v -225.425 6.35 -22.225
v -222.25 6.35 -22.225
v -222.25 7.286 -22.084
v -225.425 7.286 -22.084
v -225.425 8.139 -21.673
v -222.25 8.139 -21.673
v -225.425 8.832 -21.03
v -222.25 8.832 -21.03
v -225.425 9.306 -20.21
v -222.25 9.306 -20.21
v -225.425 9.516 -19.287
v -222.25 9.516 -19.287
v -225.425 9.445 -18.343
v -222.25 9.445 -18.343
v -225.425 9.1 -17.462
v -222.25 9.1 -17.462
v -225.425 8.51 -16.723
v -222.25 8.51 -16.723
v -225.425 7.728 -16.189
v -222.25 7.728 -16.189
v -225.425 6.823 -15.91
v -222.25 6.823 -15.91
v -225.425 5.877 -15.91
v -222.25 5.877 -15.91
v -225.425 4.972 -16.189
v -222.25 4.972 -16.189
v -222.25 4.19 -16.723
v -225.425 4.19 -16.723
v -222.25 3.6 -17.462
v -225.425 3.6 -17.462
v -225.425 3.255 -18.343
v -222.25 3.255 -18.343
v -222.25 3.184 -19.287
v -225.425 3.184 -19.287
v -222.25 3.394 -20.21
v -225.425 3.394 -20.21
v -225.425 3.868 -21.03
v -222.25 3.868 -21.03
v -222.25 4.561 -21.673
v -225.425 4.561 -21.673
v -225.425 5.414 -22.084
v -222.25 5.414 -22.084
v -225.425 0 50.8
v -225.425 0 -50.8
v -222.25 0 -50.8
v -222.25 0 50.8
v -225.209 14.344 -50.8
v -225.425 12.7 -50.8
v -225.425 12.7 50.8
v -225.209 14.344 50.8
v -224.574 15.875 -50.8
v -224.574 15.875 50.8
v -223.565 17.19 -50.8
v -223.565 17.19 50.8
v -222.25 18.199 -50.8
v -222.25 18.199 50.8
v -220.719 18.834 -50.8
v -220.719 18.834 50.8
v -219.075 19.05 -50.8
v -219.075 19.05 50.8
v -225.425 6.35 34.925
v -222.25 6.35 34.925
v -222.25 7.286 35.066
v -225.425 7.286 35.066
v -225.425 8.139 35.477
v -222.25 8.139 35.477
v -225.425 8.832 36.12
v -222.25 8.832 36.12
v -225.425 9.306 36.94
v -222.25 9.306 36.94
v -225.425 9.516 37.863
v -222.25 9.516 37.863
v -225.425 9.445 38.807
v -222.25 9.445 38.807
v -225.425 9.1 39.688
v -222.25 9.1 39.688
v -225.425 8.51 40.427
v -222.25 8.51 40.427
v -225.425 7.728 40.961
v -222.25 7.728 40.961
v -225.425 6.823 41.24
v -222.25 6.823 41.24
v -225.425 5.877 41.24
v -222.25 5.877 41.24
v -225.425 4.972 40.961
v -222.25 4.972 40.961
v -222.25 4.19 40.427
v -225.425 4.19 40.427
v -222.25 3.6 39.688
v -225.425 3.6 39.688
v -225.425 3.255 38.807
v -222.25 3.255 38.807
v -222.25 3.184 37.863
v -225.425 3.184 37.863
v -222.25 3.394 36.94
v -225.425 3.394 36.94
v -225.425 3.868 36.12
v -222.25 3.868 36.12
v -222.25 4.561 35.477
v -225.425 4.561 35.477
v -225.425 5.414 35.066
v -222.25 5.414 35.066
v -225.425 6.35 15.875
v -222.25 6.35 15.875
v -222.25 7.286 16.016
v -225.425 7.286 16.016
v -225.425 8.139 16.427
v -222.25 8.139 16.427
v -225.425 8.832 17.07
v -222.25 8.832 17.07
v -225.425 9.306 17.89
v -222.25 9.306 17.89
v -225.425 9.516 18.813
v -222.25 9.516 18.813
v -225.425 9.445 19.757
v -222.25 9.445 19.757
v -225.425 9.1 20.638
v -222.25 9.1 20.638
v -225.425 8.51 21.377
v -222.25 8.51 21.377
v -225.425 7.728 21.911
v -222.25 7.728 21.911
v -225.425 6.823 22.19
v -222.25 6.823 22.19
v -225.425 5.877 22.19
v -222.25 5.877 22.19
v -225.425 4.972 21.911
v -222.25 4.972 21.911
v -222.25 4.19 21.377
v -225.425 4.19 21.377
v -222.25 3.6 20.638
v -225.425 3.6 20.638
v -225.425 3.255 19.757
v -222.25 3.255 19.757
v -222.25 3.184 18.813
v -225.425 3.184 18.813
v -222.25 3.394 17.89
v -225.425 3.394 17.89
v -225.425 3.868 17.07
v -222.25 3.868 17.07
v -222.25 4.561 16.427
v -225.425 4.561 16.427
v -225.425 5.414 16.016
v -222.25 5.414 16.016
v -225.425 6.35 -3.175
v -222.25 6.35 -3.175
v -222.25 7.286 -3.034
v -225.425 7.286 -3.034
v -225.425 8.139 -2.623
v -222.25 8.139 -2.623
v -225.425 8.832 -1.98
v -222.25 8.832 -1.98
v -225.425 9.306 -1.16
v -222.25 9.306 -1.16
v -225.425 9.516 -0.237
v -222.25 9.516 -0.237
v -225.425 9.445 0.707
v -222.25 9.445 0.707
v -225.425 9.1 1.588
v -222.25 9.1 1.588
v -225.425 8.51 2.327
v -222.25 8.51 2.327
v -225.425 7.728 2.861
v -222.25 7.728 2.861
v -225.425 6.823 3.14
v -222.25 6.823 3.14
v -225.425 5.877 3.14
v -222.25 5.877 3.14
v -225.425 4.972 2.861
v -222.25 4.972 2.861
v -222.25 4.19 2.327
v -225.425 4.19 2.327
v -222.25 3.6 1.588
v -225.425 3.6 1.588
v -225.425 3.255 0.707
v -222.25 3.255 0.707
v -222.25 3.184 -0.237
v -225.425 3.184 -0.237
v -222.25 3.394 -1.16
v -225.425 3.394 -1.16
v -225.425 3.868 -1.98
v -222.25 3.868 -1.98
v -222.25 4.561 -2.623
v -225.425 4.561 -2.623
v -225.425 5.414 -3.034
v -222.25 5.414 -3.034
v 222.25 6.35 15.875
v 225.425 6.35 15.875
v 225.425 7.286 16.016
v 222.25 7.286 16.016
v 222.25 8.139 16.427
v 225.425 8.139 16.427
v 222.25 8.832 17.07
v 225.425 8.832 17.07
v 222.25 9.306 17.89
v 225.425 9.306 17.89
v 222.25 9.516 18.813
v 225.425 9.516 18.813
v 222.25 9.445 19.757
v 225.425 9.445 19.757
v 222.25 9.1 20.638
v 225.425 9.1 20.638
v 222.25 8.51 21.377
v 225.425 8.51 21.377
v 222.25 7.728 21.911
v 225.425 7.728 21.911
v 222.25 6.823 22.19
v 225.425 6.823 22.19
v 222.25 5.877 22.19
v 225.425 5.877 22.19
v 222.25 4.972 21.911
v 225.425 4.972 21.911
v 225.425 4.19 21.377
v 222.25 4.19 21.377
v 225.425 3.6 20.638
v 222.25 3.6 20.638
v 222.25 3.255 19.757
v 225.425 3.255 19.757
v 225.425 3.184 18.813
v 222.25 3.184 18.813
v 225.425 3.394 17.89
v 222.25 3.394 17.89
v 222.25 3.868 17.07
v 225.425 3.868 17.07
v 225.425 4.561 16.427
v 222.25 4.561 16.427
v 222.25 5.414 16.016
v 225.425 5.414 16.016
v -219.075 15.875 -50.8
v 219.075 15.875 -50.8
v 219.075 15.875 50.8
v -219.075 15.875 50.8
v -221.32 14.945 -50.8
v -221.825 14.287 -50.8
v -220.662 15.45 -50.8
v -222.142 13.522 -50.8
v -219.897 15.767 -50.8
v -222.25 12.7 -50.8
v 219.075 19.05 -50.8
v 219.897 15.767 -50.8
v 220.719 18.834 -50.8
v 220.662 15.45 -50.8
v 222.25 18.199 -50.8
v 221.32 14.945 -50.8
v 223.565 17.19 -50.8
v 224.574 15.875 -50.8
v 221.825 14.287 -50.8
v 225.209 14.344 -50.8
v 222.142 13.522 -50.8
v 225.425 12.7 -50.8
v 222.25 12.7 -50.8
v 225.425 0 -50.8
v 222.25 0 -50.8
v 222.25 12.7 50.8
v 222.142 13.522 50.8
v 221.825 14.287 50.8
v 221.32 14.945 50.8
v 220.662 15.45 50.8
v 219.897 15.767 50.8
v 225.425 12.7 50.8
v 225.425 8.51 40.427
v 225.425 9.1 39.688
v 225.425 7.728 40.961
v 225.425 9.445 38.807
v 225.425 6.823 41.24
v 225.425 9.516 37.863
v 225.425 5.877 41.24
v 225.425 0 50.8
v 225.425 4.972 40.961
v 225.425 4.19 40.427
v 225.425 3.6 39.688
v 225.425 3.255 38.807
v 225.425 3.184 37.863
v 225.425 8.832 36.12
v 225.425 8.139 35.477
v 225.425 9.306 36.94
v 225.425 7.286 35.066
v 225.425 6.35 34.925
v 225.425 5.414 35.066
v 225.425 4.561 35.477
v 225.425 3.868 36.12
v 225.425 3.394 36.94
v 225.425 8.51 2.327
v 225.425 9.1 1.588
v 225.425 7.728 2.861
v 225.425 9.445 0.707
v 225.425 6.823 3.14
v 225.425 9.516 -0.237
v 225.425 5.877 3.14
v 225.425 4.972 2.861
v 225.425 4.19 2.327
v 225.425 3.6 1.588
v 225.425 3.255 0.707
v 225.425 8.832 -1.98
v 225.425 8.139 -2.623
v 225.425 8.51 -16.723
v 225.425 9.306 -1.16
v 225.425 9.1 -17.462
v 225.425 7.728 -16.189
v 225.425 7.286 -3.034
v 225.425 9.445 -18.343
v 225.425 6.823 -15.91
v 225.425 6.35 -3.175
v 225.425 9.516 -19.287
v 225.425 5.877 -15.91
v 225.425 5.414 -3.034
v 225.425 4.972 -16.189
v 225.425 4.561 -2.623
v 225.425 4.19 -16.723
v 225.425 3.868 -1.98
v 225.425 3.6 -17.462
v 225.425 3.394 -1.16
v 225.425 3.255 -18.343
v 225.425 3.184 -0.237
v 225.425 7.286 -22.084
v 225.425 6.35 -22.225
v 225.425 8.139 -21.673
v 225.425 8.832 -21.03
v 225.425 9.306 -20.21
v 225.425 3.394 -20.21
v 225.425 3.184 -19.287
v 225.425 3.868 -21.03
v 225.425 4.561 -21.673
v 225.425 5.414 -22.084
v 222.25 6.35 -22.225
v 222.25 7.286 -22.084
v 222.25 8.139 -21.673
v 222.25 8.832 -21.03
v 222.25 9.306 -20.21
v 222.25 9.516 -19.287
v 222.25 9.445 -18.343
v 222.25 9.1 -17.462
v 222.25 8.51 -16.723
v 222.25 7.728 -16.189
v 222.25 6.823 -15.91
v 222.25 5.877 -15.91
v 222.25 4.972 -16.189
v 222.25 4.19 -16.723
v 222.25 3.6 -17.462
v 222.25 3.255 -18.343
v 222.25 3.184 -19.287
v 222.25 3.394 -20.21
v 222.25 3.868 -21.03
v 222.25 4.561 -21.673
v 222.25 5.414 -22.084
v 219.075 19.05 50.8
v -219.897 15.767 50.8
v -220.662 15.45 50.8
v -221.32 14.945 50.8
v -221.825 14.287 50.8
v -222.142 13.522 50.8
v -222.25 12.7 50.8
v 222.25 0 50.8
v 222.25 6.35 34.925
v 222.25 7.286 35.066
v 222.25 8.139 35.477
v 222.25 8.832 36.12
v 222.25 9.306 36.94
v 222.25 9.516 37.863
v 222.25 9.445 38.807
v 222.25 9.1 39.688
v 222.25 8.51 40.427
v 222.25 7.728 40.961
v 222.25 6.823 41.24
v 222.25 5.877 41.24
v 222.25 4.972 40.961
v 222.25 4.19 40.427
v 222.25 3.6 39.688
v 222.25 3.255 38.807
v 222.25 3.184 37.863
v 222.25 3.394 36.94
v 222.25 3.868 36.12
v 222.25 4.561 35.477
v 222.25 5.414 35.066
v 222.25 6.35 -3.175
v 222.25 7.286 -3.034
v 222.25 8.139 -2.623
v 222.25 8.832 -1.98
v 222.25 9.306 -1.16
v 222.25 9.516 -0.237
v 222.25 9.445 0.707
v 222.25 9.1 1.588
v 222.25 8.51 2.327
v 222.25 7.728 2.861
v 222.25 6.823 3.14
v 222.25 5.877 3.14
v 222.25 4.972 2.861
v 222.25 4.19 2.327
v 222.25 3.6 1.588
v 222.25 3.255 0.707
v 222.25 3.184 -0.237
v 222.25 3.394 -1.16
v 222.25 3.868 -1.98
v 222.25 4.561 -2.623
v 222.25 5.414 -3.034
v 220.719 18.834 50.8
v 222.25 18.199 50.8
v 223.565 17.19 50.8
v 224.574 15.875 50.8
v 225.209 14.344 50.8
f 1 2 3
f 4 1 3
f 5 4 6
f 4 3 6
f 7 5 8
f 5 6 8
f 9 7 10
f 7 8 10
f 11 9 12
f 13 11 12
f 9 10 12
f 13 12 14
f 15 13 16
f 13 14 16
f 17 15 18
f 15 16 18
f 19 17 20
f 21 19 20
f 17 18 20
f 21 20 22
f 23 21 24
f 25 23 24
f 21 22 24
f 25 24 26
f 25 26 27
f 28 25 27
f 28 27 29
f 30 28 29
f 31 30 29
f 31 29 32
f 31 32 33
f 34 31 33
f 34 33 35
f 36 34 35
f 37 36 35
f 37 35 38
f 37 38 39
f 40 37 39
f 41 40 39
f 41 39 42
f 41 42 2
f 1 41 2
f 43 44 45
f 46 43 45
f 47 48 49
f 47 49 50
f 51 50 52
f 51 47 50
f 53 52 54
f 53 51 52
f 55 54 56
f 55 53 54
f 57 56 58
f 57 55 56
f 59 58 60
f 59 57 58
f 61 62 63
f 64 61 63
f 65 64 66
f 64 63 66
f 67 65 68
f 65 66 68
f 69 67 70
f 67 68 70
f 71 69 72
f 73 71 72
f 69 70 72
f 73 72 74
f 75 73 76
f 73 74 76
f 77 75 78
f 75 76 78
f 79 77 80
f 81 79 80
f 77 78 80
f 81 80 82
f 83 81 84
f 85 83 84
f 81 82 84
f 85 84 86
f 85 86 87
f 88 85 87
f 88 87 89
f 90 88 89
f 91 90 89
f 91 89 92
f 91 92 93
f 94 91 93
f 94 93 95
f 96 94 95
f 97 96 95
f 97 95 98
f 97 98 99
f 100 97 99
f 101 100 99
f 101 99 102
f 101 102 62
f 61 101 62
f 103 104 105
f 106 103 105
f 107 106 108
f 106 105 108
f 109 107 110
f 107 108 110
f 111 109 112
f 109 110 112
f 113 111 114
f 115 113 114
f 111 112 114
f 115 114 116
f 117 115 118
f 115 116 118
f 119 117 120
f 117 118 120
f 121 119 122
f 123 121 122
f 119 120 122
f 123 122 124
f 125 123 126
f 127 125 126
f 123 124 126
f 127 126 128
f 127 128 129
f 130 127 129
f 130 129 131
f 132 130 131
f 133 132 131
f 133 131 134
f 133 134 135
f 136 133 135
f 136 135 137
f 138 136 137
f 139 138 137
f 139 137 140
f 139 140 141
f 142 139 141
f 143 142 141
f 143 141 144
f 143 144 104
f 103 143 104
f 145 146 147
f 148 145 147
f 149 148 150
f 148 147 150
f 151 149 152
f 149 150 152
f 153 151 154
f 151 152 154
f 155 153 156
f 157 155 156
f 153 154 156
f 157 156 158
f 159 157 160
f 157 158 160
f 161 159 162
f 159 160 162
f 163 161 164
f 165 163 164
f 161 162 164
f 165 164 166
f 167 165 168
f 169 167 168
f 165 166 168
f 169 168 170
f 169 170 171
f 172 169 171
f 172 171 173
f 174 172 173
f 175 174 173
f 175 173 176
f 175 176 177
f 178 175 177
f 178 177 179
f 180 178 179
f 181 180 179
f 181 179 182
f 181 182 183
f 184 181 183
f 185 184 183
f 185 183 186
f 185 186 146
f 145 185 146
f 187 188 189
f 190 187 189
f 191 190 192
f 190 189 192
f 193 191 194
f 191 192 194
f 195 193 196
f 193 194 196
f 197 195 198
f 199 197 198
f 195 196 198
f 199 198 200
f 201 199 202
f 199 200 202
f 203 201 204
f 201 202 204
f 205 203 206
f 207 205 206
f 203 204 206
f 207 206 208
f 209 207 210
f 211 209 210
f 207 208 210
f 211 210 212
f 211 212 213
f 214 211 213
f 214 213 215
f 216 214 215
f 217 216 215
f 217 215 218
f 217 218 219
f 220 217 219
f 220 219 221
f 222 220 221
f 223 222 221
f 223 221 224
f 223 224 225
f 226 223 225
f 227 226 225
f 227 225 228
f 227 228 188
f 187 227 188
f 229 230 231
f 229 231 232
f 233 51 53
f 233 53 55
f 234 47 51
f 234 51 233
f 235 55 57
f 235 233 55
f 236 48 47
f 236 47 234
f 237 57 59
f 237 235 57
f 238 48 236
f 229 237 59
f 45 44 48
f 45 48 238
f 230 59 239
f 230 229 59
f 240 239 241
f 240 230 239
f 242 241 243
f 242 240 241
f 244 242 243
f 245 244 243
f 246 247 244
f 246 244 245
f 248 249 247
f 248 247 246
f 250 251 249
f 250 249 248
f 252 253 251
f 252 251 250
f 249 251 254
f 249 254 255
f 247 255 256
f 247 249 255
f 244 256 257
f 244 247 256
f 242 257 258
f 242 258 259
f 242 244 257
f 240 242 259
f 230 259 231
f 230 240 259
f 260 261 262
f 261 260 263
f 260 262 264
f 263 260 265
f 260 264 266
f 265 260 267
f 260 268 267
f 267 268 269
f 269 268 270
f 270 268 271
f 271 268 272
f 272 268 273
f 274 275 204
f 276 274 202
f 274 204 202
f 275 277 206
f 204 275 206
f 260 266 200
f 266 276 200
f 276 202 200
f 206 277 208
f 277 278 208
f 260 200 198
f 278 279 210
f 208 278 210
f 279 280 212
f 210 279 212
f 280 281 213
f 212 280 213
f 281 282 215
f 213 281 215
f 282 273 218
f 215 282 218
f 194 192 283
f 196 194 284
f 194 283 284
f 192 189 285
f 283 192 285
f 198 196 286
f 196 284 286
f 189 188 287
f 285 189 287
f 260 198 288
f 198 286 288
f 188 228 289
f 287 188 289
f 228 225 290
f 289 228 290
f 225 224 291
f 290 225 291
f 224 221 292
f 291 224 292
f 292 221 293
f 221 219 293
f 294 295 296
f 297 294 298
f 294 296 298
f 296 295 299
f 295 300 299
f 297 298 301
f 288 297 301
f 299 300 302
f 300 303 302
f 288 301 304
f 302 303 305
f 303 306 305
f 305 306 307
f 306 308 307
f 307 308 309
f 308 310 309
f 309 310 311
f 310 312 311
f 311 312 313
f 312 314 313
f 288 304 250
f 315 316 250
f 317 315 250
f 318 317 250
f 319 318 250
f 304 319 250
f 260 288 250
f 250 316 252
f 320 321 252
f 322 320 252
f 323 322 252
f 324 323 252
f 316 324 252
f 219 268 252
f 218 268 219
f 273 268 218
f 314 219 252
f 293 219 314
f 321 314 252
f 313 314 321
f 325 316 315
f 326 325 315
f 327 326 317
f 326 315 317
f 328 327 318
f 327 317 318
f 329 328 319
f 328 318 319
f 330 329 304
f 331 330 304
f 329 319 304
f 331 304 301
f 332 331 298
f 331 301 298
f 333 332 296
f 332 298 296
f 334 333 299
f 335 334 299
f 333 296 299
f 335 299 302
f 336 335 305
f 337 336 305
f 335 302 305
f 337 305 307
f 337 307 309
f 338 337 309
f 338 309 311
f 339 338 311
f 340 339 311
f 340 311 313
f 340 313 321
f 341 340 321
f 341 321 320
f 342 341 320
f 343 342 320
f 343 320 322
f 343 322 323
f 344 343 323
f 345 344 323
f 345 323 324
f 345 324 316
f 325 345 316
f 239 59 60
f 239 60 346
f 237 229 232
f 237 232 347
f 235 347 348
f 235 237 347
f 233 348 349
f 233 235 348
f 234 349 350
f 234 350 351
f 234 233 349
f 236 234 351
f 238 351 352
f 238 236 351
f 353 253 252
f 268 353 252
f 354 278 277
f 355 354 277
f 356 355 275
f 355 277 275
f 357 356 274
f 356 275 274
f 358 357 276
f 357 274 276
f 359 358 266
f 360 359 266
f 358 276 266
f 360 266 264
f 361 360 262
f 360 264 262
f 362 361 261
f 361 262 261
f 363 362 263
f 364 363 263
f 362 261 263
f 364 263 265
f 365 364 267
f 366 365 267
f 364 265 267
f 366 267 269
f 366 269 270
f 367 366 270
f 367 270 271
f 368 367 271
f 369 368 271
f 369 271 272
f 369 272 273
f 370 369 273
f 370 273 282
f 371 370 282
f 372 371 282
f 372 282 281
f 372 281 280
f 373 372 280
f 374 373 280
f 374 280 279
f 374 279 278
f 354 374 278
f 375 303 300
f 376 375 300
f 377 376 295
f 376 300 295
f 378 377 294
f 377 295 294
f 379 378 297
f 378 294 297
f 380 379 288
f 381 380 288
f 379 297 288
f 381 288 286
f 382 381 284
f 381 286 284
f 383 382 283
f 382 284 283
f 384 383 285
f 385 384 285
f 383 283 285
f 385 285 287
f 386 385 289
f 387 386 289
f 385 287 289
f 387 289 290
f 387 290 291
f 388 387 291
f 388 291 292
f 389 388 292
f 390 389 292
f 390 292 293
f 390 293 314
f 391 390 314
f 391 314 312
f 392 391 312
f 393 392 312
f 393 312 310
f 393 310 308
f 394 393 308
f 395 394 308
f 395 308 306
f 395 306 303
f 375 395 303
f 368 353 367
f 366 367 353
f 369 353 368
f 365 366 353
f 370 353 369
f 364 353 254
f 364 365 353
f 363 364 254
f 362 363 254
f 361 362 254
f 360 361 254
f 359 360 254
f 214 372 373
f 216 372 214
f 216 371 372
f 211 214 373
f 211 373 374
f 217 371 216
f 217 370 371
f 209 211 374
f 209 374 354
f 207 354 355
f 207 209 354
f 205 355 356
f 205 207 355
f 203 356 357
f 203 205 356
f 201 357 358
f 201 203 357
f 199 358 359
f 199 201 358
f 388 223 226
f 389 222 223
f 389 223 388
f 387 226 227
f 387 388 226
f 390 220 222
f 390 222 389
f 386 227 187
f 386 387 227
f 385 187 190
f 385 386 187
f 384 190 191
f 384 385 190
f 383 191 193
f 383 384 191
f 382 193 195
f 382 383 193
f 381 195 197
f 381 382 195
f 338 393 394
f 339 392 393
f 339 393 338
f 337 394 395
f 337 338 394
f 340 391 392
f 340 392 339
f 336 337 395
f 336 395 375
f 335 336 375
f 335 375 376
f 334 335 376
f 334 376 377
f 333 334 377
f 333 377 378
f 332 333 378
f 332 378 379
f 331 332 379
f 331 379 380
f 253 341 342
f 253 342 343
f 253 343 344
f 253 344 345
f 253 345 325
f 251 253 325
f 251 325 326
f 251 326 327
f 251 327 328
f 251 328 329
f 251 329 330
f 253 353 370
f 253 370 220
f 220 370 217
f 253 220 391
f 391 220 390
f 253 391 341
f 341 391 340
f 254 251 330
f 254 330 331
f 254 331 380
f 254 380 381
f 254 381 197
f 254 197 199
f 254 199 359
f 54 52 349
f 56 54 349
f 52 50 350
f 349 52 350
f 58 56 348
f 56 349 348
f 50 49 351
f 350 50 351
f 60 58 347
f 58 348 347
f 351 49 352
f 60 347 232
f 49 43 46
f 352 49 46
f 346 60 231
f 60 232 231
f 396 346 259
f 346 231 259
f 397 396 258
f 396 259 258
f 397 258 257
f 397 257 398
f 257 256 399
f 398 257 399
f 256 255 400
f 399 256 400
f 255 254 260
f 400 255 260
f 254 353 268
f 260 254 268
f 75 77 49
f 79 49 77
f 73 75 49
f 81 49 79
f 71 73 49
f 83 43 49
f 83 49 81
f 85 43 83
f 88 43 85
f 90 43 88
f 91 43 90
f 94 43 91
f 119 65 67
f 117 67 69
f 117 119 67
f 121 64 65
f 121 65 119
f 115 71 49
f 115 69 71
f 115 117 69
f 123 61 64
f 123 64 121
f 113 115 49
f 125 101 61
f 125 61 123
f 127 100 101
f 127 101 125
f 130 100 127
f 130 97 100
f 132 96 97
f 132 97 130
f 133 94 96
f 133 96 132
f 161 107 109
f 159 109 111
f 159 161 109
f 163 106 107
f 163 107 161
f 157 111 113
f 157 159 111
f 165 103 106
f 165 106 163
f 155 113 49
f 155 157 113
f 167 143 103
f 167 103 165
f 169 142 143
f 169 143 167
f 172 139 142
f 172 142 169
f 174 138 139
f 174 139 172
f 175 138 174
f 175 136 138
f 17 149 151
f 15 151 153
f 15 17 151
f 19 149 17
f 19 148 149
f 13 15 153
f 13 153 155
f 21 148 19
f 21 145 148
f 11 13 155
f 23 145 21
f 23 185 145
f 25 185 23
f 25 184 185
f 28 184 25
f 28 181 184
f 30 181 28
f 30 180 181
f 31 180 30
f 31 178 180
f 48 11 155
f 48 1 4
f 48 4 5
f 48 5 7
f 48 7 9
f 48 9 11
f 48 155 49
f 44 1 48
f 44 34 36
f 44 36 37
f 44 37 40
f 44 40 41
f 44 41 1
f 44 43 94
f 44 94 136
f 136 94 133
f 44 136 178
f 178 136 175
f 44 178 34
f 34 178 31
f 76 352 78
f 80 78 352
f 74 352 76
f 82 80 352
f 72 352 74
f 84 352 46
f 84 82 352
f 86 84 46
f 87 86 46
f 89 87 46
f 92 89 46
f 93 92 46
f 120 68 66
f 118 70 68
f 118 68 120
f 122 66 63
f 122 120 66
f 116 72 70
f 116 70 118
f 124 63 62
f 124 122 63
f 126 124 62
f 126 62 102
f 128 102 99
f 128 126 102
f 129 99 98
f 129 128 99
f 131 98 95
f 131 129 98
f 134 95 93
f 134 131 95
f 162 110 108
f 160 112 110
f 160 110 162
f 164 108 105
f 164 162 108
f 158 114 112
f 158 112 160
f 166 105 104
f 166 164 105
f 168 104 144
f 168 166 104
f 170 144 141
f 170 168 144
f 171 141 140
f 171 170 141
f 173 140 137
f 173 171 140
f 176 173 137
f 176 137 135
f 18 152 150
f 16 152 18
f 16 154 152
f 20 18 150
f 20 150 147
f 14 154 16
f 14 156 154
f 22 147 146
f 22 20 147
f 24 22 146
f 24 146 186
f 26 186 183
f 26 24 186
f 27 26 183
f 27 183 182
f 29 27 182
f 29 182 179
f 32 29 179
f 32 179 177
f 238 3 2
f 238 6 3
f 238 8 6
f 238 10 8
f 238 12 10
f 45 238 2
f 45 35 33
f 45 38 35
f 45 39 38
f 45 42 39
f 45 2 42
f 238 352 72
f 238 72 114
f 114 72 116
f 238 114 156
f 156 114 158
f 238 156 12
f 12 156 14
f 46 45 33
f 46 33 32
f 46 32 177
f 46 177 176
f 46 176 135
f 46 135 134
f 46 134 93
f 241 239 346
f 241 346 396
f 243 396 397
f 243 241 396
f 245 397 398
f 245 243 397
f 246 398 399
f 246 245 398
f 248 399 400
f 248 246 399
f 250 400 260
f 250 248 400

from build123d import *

# Parameters (mm, degrees)
SKETCH1_W            = 450.85
SKETCH1_H            = 101.6
BOSS_EXTRUDE1_DEPTH  = 19.05
SKETCH2_R            = 3.175
CUT_EXTRUDE1_DEPTH   = 455.102703141
CONVERT_SOLID2_START = -50.8
CONVERT_SOLID2_DEPTH = 101.6


# Read off the part's stored shape, not the designer's step: Convert-Solid2
with BuildPart() as part:
    # Sketch1 → Boss-Extrude1 (new body)
    with BuildSketch(Plane(origin=(0, 0, 0), x_dir=(1, 0, 0), z_dir=(0, 1, 0))):
        Rectangle(SKETCH1_W, SKETCH1_H)
    extrude(amount=BOSS_EXTRUDE1_DEPTH)

    # Sketch2 → Cut-Extrude1 (cut, through all)
    with BuildSketch(Plane(origin=(225.425, 0, 0), x_dir=(0, 0, -1), z_dir=(1, 0, 0))):
        with Locations((-38.1, 6.35)):
            Circle(SKETCH2_R)
        with Locations((-19.05, 6.35)):
            Circle(SKETCH2_R)
        with Locations((0, 6.35)):
            Circle(SKETCH2_R)
        with Locations((19.05, 6.35)):
            Circle(SKETCH2_R)
    extrude(amount=-CUT_EXTRUDE1_DEPTH, mode=Mode.SUBTRACT)

    # Convert-Solid2 outline → Convert-Solid2 (cut)
    with BuildSketch(Plane.XY.offset(CONVERT_SOLID2_START)):
        with BuildLine():
            ThreePointArc((219.075, 19.05), (223.565128061, 17.190128061), (225.425, 12.7))
            Line((225.425, 12.7), (225.425, 19.05))
            Line((225.425, 19.05), (219.075, 19.05))
        make_face()
        with BuildLine():
            ThreePointArc((-225.425, 12.7), (-223.565128061, 17.190128061), (-219.075, 19.05))
            Line((-219.075, 19.05), (-225.425, 19.05))
            Line((-225.425, 19.05), (-225.425, 12.7))
        make_face()
        with BuildLine():
            Line((-222.25, 0), (222.25, 0))
            Line((222.25, 0), (222.25, 12.7))
            ThreePointArc((222.25, 12.7), (221.32006403, 14.94506403), (219.075, 15.875))
            Line((219.075, 15.875), (-219.075, 15.875))
            ThreePointArc((-219.075, 15.875), (-221.32006403, 14.94506403), (-222.25, 12.7))
            Line((-222.25, 12.7), (-222.25, 0))
        make_face()
    extrude(amount=CONVERT_SOLID2_DEPTH, mode=Mode.SUBTRACT)


solid = part.part
